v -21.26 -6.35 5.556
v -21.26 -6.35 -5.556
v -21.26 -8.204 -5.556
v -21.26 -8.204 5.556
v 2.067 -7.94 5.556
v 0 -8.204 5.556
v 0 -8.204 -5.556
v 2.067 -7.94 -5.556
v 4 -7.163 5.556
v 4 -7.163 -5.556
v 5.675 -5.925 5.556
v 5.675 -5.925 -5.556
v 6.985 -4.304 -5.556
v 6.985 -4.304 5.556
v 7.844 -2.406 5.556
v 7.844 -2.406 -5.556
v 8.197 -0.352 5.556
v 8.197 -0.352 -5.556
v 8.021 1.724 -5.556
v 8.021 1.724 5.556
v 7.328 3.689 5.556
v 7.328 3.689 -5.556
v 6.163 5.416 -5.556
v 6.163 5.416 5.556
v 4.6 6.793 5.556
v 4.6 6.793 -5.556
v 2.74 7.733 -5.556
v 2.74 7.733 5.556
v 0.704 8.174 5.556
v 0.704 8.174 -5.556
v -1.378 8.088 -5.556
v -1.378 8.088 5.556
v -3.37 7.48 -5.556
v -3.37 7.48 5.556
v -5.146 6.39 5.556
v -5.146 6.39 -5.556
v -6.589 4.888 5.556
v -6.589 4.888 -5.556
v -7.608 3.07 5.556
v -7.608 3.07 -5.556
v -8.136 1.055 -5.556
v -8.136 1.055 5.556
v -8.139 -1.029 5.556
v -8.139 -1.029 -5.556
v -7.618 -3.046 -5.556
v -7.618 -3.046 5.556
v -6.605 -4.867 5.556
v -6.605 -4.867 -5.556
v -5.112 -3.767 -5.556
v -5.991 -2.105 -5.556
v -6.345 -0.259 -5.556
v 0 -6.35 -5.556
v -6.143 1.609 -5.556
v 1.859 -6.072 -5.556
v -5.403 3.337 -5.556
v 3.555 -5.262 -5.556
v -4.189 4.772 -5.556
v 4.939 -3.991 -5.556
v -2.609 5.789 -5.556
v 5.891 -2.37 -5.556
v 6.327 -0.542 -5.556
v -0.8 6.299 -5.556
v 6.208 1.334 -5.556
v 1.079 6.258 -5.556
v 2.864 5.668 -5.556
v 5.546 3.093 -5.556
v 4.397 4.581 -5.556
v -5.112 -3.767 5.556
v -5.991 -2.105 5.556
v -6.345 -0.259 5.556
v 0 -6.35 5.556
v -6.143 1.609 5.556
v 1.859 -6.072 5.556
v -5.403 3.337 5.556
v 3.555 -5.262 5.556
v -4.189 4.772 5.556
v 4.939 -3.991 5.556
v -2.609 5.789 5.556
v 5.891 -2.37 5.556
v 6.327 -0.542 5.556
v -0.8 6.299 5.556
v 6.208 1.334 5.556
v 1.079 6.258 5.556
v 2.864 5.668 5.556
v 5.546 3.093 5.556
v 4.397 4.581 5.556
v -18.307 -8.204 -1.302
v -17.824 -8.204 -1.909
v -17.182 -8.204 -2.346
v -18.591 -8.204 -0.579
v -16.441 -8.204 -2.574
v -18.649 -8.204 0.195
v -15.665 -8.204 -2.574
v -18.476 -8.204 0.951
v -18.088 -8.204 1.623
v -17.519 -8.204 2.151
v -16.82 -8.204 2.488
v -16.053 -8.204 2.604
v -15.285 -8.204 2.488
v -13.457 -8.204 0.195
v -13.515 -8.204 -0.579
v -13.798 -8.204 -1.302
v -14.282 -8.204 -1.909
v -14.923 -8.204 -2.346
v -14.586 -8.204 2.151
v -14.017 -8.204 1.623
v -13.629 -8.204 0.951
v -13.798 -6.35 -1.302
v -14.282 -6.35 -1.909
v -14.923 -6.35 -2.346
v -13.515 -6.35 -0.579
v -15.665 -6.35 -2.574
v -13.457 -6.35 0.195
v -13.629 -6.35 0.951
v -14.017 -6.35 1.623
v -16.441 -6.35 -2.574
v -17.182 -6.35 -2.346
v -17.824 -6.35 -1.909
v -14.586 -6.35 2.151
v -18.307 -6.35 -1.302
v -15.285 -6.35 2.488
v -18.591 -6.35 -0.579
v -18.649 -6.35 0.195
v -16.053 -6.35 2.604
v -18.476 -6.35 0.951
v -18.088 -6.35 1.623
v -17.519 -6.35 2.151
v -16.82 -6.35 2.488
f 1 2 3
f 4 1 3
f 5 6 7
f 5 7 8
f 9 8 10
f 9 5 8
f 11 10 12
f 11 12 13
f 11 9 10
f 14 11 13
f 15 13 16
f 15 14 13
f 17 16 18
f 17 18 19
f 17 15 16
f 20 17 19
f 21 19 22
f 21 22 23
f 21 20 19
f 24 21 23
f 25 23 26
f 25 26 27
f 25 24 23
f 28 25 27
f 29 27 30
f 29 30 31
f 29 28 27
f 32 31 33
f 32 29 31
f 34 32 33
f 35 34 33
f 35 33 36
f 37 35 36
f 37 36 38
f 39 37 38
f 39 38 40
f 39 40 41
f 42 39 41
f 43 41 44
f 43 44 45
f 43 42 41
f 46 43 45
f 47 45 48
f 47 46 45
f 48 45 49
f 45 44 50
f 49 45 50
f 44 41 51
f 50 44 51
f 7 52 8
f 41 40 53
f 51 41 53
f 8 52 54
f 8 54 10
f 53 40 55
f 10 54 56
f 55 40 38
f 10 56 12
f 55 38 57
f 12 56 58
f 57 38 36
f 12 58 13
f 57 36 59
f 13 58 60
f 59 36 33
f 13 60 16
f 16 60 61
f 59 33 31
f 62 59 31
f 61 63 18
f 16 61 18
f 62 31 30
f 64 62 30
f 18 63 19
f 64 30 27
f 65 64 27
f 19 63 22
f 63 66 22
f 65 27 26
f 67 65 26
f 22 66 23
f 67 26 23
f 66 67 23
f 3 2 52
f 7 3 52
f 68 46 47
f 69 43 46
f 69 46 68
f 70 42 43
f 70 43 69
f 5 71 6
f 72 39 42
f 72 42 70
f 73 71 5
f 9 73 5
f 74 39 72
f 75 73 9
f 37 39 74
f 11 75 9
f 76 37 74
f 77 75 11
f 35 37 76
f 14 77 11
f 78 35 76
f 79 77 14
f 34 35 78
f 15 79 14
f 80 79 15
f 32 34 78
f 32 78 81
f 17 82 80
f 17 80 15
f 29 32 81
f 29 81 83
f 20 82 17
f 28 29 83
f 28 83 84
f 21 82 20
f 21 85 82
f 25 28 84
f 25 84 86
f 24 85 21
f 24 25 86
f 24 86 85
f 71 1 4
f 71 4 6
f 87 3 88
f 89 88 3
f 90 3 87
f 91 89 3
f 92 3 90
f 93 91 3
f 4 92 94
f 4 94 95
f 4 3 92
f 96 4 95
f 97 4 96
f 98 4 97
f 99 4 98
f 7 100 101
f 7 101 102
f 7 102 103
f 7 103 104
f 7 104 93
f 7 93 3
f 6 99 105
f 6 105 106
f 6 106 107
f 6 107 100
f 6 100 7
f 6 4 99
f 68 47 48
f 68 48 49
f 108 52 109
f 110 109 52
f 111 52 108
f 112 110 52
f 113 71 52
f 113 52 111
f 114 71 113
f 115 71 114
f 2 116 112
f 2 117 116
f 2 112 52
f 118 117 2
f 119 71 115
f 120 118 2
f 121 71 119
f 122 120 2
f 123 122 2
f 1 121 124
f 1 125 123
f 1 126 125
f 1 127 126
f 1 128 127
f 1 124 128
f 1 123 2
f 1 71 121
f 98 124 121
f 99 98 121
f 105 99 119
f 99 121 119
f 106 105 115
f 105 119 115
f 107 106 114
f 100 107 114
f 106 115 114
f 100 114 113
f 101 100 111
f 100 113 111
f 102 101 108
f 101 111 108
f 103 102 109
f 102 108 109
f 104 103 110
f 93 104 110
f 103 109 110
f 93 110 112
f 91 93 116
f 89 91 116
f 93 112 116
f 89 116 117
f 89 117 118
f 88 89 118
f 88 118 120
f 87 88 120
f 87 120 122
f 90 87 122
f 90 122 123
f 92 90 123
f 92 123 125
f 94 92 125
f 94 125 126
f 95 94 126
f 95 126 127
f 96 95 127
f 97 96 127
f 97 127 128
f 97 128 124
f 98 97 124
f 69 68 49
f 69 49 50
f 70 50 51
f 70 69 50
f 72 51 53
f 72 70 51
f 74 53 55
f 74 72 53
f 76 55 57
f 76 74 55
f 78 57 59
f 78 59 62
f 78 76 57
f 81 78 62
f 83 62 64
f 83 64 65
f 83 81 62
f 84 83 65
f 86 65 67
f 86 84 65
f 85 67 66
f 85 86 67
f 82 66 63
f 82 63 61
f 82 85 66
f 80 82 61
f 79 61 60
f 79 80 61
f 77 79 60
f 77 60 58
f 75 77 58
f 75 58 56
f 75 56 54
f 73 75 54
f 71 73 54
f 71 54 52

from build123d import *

# Parameters (mm, degrees)
BOSS_EXTRUDE1_DEPTH = 5.55625
SKETCH2_R           = 2.6035
CUT_EXTRUDE1_DEPTH  = 27.356702141


with BuildPart() as part:
    # Sketch1 → Boss-Extrude1 (new, symmetric)
    with BuildSketch(Plane.XY):
        with BuildLine():
            Line((-21.2598, -8.2042), (0, -8.2042))
            ThreePointArc((0, -8.2042), (3.700135792, 7.322423968), (-6.604900662, -4.86664))
            Line((-6.604900662, -4.86664), (-5.112152215, -3.766749226))
            ThreePointArc((-5.112152215, -3.766749226), (2.863882192, 5.667510811), (0, -6.35))
            Line((0, -6.35), (-21.2598, -6.35))
            Line((-21.2598, -6.35), (-21.2598, -8.2042))
        make_face()
    extrude(amount=BOSS_EXTRUDE1_DEPTH, both=True)

    # Sketch2 → Cut-Extrude1 (cut, through all)
    with BuildSketch(Plane(origin=(0, -6.35, 0), x_dir=(1, 0, 0), z_dir=(0, 1, 0))):
        with Locations(Location((-16.0528, 0, 0), (0, 0, 270))):
            Circle(SKETCH2_R)
    extrude(amount=-CUT_EXTRUDE1_DEPTH, mode=Mode.SUBTRACT)


solid = part.part
